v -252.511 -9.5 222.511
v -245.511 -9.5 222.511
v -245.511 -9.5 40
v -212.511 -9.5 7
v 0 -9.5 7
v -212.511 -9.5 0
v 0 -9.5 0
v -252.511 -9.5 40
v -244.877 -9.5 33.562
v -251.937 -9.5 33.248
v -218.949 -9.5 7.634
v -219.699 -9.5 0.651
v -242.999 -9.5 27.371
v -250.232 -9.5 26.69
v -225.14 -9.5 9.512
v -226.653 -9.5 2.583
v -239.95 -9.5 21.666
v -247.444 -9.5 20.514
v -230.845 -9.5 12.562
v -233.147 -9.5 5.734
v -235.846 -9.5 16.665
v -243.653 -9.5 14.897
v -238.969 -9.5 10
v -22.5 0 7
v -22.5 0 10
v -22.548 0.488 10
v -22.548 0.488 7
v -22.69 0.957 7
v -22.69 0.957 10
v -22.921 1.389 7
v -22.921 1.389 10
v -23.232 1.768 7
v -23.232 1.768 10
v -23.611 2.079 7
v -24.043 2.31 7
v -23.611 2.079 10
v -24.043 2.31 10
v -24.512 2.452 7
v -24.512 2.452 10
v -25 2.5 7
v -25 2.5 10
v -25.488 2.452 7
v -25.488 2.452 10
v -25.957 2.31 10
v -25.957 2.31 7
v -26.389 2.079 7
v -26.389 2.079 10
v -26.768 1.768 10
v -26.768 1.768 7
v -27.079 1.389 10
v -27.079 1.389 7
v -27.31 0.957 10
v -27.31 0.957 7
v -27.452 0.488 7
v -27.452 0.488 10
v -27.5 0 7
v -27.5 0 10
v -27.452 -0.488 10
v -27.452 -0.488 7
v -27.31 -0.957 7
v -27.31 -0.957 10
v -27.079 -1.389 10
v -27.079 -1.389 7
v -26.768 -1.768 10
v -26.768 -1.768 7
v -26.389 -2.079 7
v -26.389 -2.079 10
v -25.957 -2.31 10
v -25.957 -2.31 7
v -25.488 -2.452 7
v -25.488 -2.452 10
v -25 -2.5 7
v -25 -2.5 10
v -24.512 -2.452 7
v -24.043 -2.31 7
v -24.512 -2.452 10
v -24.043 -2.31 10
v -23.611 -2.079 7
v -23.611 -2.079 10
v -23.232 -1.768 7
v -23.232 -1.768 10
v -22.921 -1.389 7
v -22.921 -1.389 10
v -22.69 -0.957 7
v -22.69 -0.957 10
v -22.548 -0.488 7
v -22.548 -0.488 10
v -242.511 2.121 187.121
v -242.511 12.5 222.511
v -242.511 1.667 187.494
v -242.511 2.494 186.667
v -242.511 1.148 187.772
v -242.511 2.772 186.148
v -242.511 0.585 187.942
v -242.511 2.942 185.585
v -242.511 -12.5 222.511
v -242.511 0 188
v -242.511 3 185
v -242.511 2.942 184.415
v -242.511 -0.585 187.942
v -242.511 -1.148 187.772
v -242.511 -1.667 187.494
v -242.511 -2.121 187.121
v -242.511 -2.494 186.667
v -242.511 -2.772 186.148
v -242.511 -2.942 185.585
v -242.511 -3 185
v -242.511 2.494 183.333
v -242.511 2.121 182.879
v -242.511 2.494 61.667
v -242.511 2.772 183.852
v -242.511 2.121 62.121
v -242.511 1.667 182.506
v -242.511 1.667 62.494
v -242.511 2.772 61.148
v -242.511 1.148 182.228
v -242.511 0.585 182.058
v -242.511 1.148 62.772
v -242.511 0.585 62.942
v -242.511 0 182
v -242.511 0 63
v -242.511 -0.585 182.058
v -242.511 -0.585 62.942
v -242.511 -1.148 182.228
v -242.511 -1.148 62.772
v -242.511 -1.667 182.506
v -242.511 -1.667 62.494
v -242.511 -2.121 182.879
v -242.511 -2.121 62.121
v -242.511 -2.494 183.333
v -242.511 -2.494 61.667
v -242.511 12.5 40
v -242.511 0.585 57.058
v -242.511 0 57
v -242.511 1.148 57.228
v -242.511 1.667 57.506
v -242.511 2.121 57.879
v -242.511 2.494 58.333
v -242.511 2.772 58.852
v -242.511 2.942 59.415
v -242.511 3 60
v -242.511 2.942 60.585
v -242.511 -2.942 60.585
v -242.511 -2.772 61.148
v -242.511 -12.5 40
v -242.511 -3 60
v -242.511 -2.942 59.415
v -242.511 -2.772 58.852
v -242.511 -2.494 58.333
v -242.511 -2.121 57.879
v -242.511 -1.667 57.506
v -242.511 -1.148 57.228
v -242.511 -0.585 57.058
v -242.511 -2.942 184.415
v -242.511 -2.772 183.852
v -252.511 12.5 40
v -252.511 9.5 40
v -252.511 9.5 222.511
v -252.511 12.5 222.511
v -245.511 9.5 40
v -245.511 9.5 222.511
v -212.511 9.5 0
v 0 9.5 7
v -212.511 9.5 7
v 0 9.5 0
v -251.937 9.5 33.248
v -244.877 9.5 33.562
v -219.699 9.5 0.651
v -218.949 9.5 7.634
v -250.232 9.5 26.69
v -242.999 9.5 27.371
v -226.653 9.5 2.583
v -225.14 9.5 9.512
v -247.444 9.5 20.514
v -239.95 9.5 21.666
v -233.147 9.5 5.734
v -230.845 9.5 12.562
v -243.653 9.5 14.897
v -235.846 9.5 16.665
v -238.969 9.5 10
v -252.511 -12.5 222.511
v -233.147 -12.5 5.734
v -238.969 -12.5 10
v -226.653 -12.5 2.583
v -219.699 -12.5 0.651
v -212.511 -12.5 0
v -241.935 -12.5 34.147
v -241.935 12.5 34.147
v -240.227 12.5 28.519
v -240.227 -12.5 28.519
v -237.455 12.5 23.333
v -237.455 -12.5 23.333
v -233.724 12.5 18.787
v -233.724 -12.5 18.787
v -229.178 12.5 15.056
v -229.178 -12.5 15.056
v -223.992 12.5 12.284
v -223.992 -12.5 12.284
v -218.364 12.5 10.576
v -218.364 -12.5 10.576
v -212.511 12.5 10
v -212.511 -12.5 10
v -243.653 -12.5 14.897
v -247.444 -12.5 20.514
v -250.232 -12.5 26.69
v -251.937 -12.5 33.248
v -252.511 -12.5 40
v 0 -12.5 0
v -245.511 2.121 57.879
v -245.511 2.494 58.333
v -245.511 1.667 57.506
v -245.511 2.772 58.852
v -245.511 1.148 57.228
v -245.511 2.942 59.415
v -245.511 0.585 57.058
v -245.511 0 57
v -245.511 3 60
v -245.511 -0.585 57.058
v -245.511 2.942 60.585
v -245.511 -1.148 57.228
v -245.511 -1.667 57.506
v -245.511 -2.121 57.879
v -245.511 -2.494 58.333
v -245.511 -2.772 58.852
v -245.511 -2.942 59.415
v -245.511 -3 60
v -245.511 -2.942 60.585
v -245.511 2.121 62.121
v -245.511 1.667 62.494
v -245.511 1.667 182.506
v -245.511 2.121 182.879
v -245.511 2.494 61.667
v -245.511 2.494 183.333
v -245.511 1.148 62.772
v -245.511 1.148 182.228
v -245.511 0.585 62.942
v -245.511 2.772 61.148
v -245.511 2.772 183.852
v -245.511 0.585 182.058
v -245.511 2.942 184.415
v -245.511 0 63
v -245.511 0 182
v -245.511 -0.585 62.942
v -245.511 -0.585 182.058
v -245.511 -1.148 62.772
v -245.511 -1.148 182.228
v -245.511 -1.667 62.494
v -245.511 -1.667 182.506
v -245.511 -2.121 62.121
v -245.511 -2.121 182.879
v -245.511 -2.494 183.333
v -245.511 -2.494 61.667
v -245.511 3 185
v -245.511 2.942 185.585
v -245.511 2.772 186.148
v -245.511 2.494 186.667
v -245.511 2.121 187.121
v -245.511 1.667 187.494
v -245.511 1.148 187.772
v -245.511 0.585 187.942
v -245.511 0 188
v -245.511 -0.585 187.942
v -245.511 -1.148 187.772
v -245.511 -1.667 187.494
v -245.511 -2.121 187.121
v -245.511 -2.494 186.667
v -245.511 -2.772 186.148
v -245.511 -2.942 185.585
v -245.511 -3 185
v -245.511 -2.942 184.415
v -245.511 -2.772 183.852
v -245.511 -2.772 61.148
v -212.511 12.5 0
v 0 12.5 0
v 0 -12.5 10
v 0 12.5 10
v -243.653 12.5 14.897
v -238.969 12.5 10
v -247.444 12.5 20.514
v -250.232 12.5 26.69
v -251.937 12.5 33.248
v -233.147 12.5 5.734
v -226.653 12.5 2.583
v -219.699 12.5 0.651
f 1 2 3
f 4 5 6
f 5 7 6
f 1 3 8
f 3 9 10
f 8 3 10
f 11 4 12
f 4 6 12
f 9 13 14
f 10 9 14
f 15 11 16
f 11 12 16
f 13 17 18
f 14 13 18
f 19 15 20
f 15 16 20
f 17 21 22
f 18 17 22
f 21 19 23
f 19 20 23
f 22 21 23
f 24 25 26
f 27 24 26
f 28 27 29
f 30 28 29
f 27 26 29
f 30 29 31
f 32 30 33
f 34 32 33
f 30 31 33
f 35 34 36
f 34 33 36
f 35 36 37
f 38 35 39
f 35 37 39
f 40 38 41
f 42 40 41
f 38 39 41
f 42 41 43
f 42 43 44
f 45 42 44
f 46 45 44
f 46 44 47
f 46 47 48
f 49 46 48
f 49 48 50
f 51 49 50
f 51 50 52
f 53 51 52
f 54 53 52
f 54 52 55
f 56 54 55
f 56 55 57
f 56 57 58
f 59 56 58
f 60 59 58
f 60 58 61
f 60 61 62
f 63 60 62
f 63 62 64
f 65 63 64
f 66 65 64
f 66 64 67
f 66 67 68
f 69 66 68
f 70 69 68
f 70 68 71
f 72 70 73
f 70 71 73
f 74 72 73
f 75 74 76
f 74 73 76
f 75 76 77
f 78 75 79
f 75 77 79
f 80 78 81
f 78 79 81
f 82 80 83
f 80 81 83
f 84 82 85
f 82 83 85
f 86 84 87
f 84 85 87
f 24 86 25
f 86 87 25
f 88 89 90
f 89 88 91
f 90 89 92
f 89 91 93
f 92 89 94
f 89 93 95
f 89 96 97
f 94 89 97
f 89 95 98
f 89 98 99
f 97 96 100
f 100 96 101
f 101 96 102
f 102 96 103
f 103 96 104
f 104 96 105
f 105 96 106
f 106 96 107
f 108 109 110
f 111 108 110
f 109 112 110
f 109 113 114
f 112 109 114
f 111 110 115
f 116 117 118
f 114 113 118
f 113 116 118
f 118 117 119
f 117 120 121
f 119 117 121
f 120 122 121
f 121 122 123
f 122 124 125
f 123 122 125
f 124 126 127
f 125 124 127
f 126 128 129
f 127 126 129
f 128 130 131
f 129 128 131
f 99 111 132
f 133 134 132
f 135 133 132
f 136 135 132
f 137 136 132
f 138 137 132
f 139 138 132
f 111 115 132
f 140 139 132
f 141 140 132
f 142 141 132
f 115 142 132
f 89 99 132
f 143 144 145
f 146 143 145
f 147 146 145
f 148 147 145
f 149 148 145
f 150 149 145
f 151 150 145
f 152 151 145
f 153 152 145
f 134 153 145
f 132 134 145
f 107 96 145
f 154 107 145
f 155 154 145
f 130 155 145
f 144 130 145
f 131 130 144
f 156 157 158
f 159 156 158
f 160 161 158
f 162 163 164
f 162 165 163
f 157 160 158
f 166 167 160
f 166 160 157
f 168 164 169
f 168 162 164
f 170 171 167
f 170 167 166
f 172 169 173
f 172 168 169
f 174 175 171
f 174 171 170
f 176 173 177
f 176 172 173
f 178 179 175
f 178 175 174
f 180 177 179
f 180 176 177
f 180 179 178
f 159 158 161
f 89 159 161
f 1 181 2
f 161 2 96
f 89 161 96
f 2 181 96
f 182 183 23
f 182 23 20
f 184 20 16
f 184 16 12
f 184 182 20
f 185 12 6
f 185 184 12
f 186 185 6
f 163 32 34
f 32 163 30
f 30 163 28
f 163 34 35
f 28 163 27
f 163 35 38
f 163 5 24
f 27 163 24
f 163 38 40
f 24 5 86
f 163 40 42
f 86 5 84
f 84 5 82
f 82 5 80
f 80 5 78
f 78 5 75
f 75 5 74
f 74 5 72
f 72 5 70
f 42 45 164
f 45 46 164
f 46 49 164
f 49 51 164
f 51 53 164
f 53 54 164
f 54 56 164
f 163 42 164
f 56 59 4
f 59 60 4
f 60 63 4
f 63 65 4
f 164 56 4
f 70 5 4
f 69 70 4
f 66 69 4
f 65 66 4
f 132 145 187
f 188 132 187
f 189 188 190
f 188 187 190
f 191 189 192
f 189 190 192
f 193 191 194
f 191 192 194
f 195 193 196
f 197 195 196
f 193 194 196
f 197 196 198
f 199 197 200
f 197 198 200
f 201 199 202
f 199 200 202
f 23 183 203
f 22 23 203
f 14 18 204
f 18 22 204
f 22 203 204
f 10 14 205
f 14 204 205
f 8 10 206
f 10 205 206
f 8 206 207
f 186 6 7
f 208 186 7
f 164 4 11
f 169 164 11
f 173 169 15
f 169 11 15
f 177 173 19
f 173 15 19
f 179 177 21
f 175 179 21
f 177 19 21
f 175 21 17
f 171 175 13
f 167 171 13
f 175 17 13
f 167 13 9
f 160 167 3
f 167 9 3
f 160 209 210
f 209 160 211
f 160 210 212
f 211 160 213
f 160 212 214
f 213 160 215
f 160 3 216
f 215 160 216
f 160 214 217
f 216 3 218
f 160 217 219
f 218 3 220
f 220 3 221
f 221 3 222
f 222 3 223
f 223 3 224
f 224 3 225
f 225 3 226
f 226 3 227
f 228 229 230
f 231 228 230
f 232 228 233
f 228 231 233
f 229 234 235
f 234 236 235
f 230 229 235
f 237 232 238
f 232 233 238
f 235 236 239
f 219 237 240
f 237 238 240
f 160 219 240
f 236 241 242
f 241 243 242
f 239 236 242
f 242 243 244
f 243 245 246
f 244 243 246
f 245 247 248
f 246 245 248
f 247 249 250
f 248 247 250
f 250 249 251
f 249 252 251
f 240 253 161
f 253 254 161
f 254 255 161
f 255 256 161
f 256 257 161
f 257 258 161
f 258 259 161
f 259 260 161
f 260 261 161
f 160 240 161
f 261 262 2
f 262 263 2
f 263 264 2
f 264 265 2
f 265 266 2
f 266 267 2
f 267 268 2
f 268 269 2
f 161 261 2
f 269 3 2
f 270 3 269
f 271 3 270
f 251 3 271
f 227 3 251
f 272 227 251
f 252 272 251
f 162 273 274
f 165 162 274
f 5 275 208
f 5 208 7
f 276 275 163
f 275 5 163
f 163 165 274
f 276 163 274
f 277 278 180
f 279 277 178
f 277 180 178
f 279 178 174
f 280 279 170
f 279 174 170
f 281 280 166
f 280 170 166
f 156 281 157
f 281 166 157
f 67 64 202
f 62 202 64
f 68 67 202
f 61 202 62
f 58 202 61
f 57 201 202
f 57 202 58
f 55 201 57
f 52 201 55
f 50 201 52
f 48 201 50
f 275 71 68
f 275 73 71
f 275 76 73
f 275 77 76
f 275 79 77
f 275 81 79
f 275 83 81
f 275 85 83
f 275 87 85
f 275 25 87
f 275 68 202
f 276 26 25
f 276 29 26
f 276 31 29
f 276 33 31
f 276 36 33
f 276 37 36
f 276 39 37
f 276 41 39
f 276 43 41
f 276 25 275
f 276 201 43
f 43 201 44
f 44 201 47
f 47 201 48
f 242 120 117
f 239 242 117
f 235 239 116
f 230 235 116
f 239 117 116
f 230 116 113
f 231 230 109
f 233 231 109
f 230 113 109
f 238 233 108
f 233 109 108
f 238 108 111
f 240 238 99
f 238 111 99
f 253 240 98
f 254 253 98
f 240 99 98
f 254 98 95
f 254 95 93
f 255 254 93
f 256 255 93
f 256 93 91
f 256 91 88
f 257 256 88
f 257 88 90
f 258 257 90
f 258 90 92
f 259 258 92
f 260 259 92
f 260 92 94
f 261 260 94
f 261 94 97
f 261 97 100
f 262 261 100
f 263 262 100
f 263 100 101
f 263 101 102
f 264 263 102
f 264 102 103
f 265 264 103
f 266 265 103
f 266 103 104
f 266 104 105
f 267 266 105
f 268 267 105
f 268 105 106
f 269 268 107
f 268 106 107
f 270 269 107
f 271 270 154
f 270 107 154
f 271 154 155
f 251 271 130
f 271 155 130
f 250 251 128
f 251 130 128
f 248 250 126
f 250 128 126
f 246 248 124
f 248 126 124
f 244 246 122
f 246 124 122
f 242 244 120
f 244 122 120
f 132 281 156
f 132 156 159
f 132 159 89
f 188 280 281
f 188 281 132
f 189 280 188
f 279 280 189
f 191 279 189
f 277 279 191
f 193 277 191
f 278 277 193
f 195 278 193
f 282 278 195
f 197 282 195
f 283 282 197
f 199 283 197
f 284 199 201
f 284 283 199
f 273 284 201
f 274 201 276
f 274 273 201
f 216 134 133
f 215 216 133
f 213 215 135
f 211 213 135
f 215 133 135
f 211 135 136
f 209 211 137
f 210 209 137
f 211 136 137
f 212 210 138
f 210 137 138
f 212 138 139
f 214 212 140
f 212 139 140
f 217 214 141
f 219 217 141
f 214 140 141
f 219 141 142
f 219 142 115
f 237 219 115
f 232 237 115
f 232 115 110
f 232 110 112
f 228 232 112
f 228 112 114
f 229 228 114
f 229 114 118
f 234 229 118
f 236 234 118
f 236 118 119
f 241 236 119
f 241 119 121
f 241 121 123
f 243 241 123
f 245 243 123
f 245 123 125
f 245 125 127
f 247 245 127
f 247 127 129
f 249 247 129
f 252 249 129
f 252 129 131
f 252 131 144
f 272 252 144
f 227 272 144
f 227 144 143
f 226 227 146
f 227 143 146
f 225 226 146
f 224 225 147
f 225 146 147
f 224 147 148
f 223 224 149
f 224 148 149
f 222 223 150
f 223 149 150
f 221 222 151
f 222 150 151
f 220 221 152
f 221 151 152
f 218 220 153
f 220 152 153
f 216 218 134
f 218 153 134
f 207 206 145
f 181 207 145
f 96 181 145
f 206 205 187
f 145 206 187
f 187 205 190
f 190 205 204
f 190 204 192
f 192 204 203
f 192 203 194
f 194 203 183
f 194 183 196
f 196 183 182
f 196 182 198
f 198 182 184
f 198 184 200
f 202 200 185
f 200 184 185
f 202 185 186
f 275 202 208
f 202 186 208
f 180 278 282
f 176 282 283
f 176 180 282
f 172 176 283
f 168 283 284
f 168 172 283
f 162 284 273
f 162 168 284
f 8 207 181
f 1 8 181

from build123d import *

# Parameters (mm, degrees)
ESQUISSE1_W                  = 450
ESQUISSE1_H                  = 25
EXTRUSION1_DEPTH             = 10
PLIAGE_START                 = -12.5
PLIAGE_1_DEPTH               = 25
PLIAGE_1_2_DEPTH             = 25
ESQUISSE5_R                  = 3
ENL_V_MAT_EXTRU_1_DEPTH      = 330.361564282
ESQUISSE7_R                  = 2.5
ENL_V_MAT_EXTRU_2_DEPTH      = 331.27116136
ENL_V_MAT_EXTRU_3_DEPTH      = 9.5
ENL_V_MAT_EXTRU_3_DEPTH_BACK = 9.5


# Read off the part's stored shape, not the designer's step: Pliage 1
with BuildPart() as part:
    # Esquisse1 → Extrusion1 (new body)
    with BuildSketch(Plane.XY):
        with Locations((-225, 0)):
            Rectangle(ESQUISSE1_W, ESQUISSE1_H)
    extrude(amount=EXTRUSION1_DEPTH)

    # Pliage 1 outline → Pliage 1 (cut)
    with BuildSketch(Plane(origin=(0, 0, 0), x_dir=(1, 0, 0), z_dir=(0, 1, 0)).offset(PLIAGE_START)):
        with BuildLine():
            Line((-450, -10), (-238.968577392, -10))
            ThreePointArc((-238.968577392, -10), (-226.653199905, -2.583426132), (-212.511064281, 0))
            Line((-212.511064281, 0), (-450, 0))
            Line((-450, 0), (-450, -10))
        make_face()
    extrude(amount=PLIAGE_1_DEPTH, mode=Mode.SUBTRACT)

    # Pliage 1 2 outline → Pliage 1 2 (add)
    with BuildSketch(Plane(origin=(0, 0, 0), x_dir=(1, 0, 0), z_dir=(0, 1, 0)).offset(PLIAGE_START)):
        with BuildLine():
            ThreePointArc((-238.968577392, -10), (-248.968577392, -23.542486889), (-252.511064281, -40))
            Line((-252.511064281, -40), (-252.511064281, -222.511064281))
            Line((-252.511064281, -222.511064281), (-242.511064281, -222.511064281))
            Line((-242.511064281, -222.511064281), (-242.511064281, -40))
            ThreePointArc((-242.511064281, -40), (-233.724267717, -18.786796564), (-212.511064281, -10))
            Line((-212.511064281, -10), (-238.968577392, -10))
        make_face()
    extrude(amount=PLIAGE_1_2_DEPTH)

    # Esquisse5 → Enlèv. mat.-Extru.1 (cut, through all)
    with BuildSketch(Plane(origin=(-242.511064281, 0, 0), x_dir=(0, 0, -1), z_dir=(1, 0, 0))):
        with Locations((-185, 0)):
            Circle(ESQUISSE5_R)
        with Locations((-60, 0)):
            Circle(ESQUISSE5_R)
    extrude(amount=-ENL_V_MAT_EXTRU_1_DEPTH, mode=Mode.SUBTRACT)

    # Esquisse7 → Enlèv. mat.-Extru.2 (cut, through all)
    with BuildSketch(Plane.XY.offset(10)):
        with Locations((-25, 0)):
            Circle(ESQUISSE7_R)
    extrude(amount=-ENL_V_MAT_EXTRU_2_DEPTH, mode=Mode.SUBTRACT)

    # Esquisse8 → Enlèv. mat.-Extru.3 (cut, two sides: drawn at the far end of the back side and taken through both)
    with BuildSketch(Plane(origin=(0, 0, 0), x_dir=(1, 0, 0), z_dir=(0, 1, 0)).offset(-ENL_V_MAT_EXTRU_3_DEPTH_BACK)):
        with BuildLine():
            Line((0, -7), (-212.511064281, -7))
            ThreePointArc((-212.511064281, -7), (-235.84558806, -16.665476221), (-245.511064281, -40))
            Line((-245.511064281, -40), (-245.511064281, -222.511064281))
            Line((-245.511064281, -222.511064281), (-252.511064281, -222.511064281))
            Line((-252.511064281, -222.511064281), (-252.511064281, -40))
            ThreePointArc((-252.511064281, -40), (-240.795335529, -11.715728753), (-212.511064281, 0))
            Line((-212.511064281, 0), (0, 0))
            Line((0, 0), (0, -7))
        make_face()
    extrude(amount=ENL_V_MAT_EXTRU_3_DEPTH + ENL_V_MAT_EXTRU_3_DEPTH_BACK, mode=Mode.SUBTRACT)


solid = part.part
